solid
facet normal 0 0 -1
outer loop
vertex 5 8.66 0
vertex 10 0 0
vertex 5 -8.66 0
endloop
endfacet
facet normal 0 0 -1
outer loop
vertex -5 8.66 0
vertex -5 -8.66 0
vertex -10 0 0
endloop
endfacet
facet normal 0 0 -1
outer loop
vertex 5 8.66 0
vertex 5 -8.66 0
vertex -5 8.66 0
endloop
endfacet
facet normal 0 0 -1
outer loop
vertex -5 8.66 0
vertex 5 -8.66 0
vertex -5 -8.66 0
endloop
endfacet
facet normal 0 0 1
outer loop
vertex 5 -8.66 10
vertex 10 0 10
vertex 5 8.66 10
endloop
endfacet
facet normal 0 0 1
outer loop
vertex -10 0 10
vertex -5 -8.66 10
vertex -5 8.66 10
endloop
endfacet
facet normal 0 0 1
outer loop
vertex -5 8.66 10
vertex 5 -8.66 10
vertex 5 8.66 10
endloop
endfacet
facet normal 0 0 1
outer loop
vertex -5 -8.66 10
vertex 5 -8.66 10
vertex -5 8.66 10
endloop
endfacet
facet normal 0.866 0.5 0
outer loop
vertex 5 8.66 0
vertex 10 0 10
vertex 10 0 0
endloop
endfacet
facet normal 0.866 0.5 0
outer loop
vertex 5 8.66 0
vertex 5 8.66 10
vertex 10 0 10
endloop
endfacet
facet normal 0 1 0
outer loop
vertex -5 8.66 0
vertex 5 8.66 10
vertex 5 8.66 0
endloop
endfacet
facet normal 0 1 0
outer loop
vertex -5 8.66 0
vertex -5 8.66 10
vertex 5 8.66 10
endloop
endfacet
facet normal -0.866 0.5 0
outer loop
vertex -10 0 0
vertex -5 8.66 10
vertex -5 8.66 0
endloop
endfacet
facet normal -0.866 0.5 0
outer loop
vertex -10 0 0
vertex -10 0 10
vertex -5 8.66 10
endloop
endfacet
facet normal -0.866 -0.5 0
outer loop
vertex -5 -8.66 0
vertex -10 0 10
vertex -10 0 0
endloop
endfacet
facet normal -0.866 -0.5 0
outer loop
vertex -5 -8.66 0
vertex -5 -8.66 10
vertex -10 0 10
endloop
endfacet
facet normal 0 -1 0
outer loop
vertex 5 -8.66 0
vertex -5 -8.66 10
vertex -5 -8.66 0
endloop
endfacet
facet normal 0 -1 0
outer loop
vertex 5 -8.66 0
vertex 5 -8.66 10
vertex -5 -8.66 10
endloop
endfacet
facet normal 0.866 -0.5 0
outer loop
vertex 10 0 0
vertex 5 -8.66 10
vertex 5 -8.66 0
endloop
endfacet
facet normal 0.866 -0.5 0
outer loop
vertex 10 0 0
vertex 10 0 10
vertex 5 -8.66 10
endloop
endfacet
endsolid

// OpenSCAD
linear_extrude(height = 10)
{
    polygon(ngon(6, 10));
}

// Simple list comprehension for creating N-gon vertices
function ngon(num, r) = 
  [for (i=[0:num-1], a=i*360/num) [ r*cos(a), r*sin(a) ]];
